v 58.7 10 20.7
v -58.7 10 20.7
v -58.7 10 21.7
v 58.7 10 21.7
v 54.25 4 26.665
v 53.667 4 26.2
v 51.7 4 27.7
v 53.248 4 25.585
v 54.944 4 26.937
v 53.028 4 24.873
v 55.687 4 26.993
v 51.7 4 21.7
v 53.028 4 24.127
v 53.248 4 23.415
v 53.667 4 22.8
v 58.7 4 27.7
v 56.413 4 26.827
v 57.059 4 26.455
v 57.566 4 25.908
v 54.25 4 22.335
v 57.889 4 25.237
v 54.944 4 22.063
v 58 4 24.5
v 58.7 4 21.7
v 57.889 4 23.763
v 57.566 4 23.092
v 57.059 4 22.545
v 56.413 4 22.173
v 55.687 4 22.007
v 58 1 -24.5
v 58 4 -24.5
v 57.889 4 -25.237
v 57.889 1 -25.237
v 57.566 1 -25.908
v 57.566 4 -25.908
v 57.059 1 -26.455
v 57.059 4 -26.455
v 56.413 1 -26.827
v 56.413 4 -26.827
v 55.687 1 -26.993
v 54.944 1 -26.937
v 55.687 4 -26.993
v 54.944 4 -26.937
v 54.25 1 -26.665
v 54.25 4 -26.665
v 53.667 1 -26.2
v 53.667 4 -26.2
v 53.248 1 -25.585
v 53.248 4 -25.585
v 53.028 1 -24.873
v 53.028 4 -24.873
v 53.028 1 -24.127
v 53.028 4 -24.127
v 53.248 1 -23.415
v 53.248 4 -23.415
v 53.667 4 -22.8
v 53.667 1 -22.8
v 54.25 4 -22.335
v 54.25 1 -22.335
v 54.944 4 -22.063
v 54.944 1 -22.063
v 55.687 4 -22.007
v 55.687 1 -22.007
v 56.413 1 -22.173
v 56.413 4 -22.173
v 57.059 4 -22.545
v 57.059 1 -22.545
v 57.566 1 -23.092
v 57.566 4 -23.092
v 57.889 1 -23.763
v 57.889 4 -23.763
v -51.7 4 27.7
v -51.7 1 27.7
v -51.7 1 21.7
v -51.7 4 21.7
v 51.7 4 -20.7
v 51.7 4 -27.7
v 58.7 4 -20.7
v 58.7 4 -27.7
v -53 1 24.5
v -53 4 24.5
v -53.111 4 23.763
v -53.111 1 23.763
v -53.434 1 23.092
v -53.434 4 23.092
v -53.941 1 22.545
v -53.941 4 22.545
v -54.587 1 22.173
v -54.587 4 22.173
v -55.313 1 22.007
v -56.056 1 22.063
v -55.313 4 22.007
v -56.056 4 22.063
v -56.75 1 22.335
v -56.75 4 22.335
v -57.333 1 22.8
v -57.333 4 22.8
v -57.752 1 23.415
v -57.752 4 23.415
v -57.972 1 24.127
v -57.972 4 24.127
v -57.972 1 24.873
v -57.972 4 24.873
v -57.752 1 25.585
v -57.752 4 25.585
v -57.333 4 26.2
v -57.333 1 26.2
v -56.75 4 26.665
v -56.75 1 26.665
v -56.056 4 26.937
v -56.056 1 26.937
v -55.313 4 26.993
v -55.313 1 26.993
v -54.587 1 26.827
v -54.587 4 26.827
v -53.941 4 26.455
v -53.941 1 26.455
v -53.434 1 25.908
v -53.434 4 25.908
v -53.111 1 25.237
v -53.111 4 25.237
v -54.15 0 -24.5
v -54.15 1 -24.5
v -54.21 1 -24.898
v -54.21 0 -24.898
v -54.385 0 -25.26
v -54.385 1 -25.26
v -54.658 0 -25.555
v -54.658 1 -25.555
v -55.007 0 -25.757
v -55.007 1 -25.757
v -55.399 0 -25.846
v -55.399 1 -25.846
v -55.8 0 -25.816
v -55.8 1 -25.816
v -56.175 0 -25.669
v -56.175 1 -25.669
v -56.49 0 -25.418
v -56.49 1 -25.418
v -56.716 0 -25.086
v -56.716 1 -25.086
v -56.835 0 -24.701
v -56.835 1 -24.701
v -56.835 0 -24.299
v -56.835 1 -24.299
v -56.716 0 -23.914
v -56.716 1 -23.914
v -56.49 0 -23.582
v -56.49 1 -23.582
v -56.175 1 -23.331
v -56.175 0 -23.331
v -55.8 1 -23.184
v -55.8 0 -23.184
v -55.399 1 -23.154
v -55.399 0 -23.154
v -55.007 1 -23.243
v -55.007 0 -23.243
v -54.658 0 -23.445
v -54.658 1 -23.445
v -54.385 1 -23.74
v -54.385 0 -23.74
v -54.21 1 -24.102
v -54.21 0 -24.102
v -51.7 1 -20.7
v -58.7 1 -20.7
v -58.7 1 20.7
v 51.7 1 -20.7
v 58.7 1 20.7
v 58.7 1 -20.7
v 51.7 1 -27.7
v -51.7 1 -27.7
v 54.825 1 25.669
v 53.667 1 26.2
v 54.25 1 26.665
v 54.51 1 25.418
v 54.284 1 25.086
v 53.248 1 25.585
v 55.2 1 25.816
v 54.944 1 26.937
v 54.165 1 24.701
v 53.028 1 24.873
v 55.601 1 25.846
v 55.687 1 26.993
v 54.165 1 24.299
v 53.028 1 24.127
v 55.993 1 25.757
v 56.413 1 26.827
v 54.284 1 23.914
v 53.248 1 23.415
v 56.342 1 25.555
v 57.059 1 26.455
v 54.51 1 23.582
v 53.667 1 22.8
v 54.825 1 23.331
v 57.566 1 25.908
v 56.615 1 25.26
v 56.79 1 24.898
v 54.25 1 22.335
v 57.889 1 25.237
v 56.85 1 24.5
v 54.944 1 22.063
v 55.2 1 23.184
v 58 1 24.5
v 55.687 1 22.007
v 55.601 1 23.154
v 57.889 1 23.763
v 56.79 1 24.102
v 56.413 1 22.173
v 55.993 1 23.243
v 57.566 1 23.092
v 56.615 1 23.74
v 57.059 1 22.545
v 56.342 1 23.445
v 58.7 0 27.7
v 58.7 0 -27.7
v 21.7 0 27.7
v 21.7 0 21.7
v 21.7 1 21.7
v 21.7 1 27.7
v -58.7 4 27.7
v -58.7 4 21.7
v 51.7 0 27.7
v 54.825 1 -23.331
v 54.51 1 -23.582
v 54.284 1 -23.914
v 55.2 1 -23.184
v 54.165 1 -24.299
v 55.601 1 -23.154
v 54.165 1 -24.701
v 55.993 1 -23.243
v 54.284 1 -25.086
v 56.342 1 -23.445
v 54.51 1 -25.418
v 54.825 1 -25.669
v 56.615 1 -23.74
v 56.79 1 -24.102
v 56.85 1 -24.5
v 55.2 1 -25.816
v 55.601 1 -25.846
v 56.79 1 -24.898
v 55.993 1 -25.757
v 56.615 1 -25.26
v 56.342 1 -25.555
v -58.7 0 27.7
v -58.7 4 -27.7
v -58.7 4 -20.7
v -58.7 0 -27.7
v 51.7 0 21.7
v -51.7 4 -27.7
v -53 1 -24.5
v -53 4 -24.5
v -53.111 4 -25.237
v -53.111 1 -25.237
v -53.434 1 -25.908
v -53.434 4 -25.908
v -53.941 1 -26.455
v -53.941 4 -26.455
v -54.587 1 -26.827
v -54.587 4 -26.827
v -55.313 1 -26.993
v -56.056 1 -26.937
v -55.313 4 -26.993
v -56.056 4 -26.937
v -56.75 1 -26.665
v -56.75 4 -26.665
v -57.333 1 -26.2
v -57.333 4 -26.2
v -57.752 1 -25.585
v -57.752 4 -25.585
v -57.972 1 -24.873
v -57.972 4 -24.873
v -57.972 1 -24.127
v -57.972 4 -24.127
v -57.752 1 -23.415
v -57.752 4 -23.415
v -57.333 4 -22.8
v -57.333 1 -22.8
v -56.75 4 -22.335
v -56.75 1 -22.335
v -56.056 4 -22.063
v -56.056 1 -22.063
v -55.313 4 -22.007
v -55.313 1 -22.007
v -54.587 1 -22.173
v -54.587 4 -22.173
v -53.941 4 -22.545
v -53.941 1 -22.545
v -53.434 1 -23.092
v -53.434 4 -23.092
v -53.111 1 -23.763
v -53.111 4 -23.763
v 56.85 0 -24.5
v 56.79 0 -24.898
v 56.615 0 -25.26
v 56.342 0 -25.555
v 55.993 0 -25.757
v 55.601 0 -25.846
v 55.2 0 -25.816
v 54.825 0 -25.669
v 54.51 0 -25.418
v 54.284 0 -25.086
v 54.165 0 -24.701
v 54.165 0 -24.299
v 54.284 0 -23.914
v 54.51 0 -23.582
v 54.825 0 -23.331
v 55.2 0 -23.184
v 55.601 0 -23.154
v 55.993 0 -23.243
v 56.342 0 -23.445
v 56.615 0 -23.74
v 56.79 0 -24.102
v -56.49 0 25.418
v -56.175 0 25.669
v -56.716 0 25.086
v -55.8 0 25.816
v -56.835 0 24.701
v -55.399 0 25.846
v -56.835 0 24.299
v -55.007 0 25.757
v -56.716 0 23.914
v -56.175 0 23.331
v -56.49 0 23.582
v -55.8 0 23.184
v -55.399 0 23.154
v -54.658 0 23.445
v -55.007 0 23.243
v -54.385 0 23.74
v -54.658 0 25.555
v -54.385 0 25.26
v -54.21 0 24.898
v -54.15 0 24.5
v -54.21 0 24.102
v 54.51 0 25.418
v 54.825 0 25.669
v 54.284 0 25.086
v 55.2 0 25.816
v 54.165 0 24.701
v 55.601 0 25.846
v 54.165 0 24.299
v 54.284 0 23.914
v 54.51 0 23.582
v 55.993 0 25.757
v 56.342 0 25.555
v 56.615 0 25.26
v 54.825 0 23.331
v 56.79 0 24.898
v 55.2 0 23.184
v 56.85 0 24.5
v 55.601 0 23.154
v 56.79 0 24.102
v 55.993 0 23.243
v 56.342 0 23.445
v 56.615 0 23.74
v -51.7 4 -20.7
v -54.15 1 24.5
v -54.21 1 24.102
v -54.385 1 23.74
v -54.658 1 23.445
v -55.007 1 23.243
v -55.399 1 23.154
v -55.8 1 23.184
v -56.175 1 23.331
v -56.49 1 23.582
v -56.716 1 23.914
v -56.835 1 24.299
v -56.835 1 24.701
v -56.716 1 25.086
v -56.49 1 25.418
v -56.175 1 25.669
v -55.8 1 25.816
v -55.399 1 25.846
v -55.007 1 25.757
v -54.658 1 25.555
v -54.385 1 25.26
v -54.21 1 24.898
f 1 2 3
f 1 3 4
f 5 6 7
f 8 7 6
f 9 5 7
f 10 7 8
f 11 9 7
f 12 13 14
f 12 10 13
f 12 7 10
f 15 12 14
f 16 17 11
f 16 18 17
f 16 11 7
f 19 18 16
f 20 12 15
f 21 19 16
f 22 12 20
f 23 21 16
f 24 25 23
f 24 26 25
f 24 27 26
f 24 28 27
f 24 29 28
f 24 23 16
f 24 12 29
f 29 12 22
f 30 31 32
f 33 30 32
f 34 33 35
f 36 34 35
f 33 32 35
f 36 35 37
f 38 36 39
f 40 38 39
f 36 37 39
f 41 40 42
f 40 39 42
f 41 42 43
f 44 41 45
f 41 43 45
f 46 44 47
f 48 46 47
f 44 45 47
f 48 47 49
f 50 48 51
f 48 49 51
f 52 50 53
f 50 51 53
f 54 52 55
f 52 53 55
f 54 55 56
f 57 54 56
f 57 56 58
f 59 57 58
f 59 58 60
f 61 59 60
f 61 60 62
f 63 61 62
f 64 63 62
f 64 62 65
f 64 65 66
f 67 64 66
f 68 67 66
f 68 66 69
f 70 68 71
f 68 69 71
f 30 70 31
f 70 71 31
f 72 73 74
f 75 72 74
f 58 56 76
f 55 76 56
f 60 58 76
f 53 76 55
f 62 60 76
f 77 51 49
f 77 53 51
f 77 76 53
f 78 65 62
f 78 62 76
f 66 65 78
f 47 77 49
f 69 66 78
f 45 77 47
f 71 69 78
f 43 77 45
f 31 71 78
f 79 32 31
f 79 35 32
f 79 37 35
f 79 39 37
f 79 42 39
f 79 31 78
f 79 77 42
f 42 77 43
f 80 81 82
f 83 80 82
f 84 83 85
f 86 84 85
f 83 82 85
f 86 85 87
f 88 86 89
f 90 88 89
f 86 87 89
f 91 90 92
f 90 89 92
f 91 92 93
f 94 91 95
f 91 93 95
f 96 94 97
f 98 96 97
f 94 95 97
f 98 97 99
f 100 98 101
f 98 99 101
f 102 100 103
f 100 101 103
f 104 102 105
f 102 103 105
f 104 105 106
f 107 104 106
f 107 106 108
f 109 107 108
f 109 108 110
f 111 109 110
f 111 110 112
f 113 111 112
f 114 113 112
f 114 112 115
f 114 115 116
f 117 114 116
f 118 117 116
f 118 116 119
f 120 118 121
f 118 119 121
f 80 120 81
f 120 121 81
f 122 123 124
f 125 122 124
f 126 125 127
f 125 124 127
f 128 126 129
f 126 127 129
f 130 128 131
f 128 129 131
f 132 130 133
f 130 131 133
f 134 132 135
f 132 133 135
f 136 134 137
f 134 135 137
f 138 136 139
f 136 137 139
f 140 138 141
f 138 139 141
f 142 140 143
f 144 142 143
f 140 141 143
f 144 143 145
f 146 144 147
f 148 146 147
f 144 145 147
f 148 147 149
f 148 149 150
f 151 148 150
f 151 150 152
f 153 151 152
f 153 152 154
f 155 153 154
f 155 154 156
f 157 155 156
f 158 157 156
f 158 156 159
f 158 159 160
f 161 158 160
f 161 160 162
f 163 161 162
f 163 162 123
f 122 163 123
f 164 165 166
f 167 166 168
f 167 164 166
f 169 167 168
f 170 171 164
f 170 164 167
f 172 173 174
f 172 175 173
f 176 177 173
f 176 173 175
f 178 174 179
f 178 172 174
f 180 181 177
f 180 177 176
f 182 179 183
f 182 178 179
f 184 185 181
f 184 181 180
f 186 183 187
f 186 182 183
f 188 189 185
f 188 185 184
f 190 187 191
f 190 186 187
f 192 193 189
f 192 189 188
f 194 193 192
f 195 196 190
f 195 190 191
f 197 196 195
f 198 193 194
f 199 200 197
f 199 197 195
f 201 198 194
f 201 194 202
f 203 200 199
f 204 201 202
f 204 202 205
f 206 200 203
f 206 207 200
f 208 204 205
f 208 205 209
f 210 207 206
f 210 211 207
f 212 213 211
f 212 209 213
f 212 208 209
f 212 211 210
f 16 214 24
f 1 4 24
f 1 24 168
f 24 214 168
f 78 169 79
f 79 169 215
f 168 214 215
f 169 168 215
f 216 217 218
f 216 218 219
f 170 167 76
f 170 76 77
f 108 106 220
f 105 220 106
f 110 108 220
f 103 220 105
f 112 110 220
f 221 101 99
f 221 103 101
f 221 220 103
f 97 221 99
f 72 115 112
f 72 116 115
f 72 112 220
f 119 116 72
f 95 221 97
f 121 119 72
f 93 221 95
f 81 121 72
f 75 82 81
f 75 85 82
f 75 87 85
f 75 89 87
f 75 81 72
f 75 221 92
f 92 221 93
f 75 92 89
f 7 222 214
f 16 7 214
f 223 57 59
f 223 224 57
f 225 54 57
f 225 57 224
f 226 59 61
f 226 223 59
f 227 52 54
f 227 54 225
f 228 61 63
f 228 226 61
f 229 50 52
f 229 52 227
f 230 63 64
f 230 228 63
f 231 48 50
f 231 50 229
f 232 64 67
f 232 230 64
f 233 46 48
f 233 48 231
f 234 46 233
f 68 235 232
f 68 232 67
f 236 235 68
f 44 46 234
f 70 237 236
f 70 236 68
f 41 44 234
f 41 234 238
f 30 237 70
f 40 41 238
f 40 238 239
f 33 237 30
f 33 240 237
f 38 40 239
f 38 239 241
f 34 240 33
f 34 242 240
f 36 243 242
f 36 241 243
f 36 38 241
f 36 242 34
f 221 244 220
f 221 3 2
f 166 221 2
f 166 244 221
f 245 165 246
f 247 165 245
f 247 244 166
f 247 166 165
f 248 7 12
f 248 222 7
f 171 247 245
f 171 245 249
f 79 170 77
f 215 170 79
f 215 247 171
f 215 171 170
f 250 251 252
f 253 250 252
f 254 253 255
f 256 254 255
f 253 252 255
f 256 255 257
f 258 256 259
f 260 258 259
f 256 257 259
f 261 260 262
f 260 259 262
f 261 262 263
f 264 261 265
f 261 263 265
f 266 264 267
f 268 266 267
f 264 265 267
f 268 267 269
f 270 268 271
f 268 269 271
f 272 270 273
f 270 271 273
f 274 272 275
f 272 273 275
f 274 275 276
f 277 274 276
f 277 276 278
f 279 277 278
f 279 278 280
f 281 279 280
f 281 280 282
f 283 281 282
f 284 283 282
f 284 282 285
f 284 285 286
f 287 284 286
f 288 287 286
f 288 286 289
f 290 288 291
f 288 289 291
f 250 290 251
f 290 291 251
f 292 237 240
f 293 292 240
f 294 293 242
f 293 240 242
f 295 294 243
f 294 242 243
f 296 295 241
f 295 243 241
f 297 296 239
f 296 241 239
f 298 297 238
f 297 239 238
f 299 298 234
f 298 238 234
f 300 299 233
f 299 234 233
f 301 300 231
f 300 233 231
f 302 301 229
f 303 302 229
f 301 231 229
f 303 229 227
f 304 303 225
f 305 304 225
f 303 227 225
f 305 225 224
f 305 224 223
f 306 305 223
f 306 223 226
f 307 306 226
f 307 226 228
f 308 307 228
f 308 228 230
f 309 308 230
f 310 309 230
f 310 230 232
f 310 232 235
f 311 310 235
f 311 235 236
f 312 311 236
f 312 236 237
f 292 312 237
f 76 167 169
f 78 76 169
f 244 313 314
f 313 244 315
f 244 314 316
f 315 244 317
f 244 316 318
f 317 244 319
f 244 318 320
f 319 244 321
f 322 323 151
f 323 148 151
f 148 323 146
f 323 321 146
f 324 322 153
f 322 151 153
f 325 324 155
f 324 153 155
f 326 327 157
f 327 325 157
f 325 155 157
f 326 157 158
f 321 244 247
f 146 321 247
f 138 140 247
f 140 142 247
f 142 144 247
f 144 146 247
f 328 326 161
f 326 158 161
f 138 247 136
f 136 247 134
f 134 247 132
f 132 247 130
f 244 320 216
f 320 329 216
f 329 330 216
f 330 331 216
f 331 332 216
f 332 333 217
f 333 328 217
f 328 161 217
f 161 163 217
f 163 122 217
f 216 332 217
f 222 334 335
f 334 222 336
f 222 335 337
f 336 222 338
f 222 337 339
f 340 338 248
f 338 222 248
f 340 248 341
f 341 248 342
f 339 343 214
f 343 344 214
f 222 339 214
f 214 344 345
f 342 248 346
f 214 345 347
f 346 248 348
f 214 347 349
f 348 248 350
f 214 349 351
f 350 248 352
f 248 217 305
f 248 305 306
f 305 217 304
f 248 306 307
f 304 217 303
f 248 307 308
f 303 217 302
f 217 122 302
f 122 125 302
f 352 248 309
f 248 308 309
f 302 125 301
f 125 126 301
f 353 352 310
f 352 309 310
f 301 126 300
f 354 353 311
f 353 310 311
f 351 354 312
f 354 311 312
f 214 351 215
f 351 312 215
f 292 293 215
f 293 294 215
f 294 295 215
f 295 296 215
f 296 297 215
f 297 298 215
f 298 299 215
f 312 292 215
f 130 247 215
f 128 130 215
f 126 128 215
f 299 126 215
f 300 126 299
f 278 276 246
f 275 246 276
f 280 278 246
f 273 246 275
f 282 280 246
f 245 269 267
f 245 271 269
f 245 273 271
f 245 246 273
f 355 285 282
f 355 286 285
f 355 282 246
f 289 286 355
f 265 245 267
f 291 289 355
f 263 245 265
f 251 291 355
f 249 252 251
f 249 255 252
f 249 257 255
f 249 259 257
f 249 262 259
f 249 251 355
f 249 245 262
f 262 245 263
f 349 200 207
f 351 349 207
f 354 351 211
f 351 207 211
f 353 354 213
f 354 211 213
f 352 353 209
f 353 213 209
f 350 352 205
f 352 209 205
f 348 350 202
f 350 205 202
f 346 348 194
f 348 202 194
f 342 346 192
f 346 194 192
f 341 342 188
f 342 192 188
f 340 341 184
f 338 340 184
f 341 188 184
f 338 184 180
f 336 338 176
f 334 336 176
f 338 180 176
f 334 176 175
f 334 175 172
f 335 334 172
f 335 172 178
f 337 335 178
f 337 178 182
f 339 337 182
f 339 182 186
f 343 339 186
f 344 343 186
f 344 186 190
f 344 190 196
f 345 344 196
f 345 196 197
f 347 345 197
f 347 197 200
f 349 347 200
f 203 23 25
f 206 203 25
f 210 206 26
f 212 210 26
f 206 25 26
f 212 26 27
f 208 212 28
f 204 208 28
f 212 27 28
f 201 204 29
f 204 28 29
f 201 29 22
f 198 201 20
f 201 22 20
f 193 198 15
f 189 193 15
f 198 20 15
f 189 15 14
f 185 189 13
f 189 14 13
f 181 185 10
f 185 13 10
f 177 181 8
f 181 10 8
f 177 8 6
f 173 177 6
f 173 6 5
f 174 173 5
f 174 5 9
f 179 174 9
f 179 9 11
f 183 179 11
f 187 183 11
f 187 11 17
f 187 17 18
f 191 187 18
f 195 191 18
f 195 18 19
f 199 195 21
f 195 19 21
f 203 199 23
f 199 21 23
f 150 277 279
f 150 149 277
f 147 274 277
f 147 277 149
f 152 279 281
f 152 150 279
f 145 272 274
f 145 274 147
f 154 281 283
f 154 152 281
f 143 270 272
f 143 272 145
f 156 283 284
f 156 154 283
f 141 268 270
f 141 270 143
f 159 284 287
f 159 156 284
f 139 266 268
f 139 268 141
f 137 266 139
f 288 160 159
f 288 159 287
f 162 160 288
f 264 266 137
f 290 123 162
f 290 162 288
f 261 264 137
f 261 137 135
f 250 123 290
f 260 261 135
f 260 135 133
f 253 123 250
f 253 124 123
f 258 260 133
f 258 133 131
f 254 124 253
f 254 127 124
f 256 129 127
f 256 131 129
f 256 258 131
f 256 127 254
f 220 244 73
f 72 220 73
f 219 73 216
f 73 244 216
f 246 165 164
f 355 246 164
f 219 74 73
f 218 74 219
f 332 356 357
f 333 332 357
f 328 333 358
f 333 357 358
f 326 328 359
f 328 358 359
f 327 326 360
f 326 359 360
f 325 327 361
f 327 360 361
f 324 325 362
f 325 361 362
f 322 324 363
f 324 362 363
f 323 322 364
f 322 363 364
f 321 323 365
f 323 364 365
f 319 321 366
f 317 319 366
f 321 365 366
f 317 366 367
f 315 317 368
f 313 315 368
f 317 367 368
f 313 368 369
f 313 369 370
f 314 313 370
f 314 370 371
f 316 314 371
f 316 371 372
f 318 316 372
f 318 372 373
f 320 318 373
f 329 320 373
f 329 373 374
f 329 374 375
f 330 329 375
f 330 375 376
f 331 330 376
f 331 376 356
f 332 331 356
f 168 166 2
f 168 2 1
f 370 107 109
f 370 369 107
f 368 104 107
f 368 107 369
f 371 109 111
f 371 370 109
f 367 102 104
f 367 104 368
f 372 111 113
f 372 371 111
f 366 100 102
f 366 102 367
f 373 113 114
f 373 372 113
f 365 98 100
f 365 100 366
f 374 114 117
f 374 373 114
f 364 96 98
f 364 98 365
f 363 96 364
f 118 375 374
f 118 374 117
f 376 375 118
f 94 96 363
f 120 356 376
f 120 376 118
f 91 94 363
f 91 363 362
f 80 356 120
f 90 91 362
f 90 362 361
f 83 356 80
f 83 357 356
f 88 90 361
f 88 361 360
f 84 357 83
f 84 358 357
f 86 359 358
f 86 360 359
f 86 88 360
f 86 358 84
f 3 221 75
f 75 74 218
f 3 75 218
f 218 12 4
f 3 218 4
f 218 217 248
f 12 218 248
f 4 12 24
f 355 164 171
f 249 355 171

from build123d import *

# Parameters (mm, degrees)
SKETCH1_W           = 117.4
SKETCH1_H           = 55.4
BOSS_EXTRUDE1_DEPTH = 1
SKETCH2_W           = 7
SKETCH2_H           = 7
BOSS_EXTRUDE2_DEPTH = 3
SKETCH3_R           = 1.35
CUT_EXTRUDE1_DEPTH  = 5
SKETCH7_W           = 30
SKETCH7_H           = 6
CUT_EXTRUDE5_DEPTH  = 5
SKETCH9_R           = 2.5
CUT_EXTRUDE6_DEPTH  = 3
SKETCH10_W          = 117.4
SKETCH10_H          = 1
BOSS_EXTRUDE3_DEPTH = 9


with BuildPart() as part:
    # Sketch1 → Boss-Extrude1 (new body)
    with BuildSketch(Plane(origin=(0, 0, 0), x_dir=(1, 0, 0), z_dir=(0, 1, 0))):
        Rectangle(SKETCH1_W, SKETCH1_H)
    extrude(amount=BOSS_EXTRUDE1_DEPTH)

    # Sketch2 → Boss-Extrude2 (add)
    with BuildSketch(Plane(origin=(0, 1, 0), x_dir=(1, 0, 0), z_dir=(0, 1, 0))):
        with Locations((55.2, 24.2)):
            Rectangle(SKETCH2_W, SKETCH2_H)
        with Locations((-55.2, 24.2)):
            Rectangle(SKETCH2_W, SKETCH2_H)
        with Locations((55.2, -24.2)):
            Rectangle(SKETCH2_W, SKETCH2_H)
        with Locations((-55.2, -24.2)):
            Rectangle(SKETCH2_W, SKETCH2_H)
    extrude(amount=BOSS_EXTRUDE2_DEPTH)

    # Sketch3 → Cut-Extrude1 (cut, through all)
    with BuildSketch(Plane(origin=(0, 4, 0), x_dir=(1, 0, 0), z_dir=(0, 1, 0))):
        with Locations((-55.5, 24.5)):
            Circle(SKETCH3_R)
        with Locations((55.5, 24.5)):
            Circle(SKETCH3_R)
        with Locations((55.5, -24.5)):
            Circle(SKETCH3_R)
        with Locations((-55.5, -24.5)):
            Circle(SKETCH3_R)
    extrude(amount=-CUT_EXTRUDE1_DEPTH, mode=Mode.SUBTRACT)

    # Sketch7 → Cut-Extrude5 (cut, through all)
    with BuildSketch(Plane.XZ):
        with Locations((36.7, 24.7)):
            Rectangle(SKETCH7_W, SKETCH7_H)
    extrude(amount=-CUT_EXTRUDE5_DEPTH, mode=Mode.SUBTRACT)

    # Sketch9 → Cut-Extrude6 (cut)
    with BuildSketch(Plane(origin=(0, 4, 0), x_dir=(1, 0, 0), z_dir=(0, 1, 0))):
        with Locations((-55.5, 24.5)):
            Circle(SKETCH9_R)
        with Locations((55.5, 24.5)):
            Circle(SKETCH9_R)
        with Locations((55.5, -24.5)):
            Circle(SKETCH9_R)
        with Locations((-55.5, -24.5)):
            Circle(SKETCH9_R)
    extrude(amount=-CUT_EXTRUDE6_DEPTH, mode=Mode.SUBTRACT)

    # Sketch10 → Boss-Extrude3 (add)
    with BuildSketch(Plane(origin=(0, 1, 0), x_dir=(1, 0, 0), z_dir=(0, 1, 0))):
        with Locations((0, -21.2)):
            Rectangle(SKETCH10_W, SKETCH10_H)
    extrude(amount=BOSS_EXTRUDE3_DEPTH)


solid = part.part
